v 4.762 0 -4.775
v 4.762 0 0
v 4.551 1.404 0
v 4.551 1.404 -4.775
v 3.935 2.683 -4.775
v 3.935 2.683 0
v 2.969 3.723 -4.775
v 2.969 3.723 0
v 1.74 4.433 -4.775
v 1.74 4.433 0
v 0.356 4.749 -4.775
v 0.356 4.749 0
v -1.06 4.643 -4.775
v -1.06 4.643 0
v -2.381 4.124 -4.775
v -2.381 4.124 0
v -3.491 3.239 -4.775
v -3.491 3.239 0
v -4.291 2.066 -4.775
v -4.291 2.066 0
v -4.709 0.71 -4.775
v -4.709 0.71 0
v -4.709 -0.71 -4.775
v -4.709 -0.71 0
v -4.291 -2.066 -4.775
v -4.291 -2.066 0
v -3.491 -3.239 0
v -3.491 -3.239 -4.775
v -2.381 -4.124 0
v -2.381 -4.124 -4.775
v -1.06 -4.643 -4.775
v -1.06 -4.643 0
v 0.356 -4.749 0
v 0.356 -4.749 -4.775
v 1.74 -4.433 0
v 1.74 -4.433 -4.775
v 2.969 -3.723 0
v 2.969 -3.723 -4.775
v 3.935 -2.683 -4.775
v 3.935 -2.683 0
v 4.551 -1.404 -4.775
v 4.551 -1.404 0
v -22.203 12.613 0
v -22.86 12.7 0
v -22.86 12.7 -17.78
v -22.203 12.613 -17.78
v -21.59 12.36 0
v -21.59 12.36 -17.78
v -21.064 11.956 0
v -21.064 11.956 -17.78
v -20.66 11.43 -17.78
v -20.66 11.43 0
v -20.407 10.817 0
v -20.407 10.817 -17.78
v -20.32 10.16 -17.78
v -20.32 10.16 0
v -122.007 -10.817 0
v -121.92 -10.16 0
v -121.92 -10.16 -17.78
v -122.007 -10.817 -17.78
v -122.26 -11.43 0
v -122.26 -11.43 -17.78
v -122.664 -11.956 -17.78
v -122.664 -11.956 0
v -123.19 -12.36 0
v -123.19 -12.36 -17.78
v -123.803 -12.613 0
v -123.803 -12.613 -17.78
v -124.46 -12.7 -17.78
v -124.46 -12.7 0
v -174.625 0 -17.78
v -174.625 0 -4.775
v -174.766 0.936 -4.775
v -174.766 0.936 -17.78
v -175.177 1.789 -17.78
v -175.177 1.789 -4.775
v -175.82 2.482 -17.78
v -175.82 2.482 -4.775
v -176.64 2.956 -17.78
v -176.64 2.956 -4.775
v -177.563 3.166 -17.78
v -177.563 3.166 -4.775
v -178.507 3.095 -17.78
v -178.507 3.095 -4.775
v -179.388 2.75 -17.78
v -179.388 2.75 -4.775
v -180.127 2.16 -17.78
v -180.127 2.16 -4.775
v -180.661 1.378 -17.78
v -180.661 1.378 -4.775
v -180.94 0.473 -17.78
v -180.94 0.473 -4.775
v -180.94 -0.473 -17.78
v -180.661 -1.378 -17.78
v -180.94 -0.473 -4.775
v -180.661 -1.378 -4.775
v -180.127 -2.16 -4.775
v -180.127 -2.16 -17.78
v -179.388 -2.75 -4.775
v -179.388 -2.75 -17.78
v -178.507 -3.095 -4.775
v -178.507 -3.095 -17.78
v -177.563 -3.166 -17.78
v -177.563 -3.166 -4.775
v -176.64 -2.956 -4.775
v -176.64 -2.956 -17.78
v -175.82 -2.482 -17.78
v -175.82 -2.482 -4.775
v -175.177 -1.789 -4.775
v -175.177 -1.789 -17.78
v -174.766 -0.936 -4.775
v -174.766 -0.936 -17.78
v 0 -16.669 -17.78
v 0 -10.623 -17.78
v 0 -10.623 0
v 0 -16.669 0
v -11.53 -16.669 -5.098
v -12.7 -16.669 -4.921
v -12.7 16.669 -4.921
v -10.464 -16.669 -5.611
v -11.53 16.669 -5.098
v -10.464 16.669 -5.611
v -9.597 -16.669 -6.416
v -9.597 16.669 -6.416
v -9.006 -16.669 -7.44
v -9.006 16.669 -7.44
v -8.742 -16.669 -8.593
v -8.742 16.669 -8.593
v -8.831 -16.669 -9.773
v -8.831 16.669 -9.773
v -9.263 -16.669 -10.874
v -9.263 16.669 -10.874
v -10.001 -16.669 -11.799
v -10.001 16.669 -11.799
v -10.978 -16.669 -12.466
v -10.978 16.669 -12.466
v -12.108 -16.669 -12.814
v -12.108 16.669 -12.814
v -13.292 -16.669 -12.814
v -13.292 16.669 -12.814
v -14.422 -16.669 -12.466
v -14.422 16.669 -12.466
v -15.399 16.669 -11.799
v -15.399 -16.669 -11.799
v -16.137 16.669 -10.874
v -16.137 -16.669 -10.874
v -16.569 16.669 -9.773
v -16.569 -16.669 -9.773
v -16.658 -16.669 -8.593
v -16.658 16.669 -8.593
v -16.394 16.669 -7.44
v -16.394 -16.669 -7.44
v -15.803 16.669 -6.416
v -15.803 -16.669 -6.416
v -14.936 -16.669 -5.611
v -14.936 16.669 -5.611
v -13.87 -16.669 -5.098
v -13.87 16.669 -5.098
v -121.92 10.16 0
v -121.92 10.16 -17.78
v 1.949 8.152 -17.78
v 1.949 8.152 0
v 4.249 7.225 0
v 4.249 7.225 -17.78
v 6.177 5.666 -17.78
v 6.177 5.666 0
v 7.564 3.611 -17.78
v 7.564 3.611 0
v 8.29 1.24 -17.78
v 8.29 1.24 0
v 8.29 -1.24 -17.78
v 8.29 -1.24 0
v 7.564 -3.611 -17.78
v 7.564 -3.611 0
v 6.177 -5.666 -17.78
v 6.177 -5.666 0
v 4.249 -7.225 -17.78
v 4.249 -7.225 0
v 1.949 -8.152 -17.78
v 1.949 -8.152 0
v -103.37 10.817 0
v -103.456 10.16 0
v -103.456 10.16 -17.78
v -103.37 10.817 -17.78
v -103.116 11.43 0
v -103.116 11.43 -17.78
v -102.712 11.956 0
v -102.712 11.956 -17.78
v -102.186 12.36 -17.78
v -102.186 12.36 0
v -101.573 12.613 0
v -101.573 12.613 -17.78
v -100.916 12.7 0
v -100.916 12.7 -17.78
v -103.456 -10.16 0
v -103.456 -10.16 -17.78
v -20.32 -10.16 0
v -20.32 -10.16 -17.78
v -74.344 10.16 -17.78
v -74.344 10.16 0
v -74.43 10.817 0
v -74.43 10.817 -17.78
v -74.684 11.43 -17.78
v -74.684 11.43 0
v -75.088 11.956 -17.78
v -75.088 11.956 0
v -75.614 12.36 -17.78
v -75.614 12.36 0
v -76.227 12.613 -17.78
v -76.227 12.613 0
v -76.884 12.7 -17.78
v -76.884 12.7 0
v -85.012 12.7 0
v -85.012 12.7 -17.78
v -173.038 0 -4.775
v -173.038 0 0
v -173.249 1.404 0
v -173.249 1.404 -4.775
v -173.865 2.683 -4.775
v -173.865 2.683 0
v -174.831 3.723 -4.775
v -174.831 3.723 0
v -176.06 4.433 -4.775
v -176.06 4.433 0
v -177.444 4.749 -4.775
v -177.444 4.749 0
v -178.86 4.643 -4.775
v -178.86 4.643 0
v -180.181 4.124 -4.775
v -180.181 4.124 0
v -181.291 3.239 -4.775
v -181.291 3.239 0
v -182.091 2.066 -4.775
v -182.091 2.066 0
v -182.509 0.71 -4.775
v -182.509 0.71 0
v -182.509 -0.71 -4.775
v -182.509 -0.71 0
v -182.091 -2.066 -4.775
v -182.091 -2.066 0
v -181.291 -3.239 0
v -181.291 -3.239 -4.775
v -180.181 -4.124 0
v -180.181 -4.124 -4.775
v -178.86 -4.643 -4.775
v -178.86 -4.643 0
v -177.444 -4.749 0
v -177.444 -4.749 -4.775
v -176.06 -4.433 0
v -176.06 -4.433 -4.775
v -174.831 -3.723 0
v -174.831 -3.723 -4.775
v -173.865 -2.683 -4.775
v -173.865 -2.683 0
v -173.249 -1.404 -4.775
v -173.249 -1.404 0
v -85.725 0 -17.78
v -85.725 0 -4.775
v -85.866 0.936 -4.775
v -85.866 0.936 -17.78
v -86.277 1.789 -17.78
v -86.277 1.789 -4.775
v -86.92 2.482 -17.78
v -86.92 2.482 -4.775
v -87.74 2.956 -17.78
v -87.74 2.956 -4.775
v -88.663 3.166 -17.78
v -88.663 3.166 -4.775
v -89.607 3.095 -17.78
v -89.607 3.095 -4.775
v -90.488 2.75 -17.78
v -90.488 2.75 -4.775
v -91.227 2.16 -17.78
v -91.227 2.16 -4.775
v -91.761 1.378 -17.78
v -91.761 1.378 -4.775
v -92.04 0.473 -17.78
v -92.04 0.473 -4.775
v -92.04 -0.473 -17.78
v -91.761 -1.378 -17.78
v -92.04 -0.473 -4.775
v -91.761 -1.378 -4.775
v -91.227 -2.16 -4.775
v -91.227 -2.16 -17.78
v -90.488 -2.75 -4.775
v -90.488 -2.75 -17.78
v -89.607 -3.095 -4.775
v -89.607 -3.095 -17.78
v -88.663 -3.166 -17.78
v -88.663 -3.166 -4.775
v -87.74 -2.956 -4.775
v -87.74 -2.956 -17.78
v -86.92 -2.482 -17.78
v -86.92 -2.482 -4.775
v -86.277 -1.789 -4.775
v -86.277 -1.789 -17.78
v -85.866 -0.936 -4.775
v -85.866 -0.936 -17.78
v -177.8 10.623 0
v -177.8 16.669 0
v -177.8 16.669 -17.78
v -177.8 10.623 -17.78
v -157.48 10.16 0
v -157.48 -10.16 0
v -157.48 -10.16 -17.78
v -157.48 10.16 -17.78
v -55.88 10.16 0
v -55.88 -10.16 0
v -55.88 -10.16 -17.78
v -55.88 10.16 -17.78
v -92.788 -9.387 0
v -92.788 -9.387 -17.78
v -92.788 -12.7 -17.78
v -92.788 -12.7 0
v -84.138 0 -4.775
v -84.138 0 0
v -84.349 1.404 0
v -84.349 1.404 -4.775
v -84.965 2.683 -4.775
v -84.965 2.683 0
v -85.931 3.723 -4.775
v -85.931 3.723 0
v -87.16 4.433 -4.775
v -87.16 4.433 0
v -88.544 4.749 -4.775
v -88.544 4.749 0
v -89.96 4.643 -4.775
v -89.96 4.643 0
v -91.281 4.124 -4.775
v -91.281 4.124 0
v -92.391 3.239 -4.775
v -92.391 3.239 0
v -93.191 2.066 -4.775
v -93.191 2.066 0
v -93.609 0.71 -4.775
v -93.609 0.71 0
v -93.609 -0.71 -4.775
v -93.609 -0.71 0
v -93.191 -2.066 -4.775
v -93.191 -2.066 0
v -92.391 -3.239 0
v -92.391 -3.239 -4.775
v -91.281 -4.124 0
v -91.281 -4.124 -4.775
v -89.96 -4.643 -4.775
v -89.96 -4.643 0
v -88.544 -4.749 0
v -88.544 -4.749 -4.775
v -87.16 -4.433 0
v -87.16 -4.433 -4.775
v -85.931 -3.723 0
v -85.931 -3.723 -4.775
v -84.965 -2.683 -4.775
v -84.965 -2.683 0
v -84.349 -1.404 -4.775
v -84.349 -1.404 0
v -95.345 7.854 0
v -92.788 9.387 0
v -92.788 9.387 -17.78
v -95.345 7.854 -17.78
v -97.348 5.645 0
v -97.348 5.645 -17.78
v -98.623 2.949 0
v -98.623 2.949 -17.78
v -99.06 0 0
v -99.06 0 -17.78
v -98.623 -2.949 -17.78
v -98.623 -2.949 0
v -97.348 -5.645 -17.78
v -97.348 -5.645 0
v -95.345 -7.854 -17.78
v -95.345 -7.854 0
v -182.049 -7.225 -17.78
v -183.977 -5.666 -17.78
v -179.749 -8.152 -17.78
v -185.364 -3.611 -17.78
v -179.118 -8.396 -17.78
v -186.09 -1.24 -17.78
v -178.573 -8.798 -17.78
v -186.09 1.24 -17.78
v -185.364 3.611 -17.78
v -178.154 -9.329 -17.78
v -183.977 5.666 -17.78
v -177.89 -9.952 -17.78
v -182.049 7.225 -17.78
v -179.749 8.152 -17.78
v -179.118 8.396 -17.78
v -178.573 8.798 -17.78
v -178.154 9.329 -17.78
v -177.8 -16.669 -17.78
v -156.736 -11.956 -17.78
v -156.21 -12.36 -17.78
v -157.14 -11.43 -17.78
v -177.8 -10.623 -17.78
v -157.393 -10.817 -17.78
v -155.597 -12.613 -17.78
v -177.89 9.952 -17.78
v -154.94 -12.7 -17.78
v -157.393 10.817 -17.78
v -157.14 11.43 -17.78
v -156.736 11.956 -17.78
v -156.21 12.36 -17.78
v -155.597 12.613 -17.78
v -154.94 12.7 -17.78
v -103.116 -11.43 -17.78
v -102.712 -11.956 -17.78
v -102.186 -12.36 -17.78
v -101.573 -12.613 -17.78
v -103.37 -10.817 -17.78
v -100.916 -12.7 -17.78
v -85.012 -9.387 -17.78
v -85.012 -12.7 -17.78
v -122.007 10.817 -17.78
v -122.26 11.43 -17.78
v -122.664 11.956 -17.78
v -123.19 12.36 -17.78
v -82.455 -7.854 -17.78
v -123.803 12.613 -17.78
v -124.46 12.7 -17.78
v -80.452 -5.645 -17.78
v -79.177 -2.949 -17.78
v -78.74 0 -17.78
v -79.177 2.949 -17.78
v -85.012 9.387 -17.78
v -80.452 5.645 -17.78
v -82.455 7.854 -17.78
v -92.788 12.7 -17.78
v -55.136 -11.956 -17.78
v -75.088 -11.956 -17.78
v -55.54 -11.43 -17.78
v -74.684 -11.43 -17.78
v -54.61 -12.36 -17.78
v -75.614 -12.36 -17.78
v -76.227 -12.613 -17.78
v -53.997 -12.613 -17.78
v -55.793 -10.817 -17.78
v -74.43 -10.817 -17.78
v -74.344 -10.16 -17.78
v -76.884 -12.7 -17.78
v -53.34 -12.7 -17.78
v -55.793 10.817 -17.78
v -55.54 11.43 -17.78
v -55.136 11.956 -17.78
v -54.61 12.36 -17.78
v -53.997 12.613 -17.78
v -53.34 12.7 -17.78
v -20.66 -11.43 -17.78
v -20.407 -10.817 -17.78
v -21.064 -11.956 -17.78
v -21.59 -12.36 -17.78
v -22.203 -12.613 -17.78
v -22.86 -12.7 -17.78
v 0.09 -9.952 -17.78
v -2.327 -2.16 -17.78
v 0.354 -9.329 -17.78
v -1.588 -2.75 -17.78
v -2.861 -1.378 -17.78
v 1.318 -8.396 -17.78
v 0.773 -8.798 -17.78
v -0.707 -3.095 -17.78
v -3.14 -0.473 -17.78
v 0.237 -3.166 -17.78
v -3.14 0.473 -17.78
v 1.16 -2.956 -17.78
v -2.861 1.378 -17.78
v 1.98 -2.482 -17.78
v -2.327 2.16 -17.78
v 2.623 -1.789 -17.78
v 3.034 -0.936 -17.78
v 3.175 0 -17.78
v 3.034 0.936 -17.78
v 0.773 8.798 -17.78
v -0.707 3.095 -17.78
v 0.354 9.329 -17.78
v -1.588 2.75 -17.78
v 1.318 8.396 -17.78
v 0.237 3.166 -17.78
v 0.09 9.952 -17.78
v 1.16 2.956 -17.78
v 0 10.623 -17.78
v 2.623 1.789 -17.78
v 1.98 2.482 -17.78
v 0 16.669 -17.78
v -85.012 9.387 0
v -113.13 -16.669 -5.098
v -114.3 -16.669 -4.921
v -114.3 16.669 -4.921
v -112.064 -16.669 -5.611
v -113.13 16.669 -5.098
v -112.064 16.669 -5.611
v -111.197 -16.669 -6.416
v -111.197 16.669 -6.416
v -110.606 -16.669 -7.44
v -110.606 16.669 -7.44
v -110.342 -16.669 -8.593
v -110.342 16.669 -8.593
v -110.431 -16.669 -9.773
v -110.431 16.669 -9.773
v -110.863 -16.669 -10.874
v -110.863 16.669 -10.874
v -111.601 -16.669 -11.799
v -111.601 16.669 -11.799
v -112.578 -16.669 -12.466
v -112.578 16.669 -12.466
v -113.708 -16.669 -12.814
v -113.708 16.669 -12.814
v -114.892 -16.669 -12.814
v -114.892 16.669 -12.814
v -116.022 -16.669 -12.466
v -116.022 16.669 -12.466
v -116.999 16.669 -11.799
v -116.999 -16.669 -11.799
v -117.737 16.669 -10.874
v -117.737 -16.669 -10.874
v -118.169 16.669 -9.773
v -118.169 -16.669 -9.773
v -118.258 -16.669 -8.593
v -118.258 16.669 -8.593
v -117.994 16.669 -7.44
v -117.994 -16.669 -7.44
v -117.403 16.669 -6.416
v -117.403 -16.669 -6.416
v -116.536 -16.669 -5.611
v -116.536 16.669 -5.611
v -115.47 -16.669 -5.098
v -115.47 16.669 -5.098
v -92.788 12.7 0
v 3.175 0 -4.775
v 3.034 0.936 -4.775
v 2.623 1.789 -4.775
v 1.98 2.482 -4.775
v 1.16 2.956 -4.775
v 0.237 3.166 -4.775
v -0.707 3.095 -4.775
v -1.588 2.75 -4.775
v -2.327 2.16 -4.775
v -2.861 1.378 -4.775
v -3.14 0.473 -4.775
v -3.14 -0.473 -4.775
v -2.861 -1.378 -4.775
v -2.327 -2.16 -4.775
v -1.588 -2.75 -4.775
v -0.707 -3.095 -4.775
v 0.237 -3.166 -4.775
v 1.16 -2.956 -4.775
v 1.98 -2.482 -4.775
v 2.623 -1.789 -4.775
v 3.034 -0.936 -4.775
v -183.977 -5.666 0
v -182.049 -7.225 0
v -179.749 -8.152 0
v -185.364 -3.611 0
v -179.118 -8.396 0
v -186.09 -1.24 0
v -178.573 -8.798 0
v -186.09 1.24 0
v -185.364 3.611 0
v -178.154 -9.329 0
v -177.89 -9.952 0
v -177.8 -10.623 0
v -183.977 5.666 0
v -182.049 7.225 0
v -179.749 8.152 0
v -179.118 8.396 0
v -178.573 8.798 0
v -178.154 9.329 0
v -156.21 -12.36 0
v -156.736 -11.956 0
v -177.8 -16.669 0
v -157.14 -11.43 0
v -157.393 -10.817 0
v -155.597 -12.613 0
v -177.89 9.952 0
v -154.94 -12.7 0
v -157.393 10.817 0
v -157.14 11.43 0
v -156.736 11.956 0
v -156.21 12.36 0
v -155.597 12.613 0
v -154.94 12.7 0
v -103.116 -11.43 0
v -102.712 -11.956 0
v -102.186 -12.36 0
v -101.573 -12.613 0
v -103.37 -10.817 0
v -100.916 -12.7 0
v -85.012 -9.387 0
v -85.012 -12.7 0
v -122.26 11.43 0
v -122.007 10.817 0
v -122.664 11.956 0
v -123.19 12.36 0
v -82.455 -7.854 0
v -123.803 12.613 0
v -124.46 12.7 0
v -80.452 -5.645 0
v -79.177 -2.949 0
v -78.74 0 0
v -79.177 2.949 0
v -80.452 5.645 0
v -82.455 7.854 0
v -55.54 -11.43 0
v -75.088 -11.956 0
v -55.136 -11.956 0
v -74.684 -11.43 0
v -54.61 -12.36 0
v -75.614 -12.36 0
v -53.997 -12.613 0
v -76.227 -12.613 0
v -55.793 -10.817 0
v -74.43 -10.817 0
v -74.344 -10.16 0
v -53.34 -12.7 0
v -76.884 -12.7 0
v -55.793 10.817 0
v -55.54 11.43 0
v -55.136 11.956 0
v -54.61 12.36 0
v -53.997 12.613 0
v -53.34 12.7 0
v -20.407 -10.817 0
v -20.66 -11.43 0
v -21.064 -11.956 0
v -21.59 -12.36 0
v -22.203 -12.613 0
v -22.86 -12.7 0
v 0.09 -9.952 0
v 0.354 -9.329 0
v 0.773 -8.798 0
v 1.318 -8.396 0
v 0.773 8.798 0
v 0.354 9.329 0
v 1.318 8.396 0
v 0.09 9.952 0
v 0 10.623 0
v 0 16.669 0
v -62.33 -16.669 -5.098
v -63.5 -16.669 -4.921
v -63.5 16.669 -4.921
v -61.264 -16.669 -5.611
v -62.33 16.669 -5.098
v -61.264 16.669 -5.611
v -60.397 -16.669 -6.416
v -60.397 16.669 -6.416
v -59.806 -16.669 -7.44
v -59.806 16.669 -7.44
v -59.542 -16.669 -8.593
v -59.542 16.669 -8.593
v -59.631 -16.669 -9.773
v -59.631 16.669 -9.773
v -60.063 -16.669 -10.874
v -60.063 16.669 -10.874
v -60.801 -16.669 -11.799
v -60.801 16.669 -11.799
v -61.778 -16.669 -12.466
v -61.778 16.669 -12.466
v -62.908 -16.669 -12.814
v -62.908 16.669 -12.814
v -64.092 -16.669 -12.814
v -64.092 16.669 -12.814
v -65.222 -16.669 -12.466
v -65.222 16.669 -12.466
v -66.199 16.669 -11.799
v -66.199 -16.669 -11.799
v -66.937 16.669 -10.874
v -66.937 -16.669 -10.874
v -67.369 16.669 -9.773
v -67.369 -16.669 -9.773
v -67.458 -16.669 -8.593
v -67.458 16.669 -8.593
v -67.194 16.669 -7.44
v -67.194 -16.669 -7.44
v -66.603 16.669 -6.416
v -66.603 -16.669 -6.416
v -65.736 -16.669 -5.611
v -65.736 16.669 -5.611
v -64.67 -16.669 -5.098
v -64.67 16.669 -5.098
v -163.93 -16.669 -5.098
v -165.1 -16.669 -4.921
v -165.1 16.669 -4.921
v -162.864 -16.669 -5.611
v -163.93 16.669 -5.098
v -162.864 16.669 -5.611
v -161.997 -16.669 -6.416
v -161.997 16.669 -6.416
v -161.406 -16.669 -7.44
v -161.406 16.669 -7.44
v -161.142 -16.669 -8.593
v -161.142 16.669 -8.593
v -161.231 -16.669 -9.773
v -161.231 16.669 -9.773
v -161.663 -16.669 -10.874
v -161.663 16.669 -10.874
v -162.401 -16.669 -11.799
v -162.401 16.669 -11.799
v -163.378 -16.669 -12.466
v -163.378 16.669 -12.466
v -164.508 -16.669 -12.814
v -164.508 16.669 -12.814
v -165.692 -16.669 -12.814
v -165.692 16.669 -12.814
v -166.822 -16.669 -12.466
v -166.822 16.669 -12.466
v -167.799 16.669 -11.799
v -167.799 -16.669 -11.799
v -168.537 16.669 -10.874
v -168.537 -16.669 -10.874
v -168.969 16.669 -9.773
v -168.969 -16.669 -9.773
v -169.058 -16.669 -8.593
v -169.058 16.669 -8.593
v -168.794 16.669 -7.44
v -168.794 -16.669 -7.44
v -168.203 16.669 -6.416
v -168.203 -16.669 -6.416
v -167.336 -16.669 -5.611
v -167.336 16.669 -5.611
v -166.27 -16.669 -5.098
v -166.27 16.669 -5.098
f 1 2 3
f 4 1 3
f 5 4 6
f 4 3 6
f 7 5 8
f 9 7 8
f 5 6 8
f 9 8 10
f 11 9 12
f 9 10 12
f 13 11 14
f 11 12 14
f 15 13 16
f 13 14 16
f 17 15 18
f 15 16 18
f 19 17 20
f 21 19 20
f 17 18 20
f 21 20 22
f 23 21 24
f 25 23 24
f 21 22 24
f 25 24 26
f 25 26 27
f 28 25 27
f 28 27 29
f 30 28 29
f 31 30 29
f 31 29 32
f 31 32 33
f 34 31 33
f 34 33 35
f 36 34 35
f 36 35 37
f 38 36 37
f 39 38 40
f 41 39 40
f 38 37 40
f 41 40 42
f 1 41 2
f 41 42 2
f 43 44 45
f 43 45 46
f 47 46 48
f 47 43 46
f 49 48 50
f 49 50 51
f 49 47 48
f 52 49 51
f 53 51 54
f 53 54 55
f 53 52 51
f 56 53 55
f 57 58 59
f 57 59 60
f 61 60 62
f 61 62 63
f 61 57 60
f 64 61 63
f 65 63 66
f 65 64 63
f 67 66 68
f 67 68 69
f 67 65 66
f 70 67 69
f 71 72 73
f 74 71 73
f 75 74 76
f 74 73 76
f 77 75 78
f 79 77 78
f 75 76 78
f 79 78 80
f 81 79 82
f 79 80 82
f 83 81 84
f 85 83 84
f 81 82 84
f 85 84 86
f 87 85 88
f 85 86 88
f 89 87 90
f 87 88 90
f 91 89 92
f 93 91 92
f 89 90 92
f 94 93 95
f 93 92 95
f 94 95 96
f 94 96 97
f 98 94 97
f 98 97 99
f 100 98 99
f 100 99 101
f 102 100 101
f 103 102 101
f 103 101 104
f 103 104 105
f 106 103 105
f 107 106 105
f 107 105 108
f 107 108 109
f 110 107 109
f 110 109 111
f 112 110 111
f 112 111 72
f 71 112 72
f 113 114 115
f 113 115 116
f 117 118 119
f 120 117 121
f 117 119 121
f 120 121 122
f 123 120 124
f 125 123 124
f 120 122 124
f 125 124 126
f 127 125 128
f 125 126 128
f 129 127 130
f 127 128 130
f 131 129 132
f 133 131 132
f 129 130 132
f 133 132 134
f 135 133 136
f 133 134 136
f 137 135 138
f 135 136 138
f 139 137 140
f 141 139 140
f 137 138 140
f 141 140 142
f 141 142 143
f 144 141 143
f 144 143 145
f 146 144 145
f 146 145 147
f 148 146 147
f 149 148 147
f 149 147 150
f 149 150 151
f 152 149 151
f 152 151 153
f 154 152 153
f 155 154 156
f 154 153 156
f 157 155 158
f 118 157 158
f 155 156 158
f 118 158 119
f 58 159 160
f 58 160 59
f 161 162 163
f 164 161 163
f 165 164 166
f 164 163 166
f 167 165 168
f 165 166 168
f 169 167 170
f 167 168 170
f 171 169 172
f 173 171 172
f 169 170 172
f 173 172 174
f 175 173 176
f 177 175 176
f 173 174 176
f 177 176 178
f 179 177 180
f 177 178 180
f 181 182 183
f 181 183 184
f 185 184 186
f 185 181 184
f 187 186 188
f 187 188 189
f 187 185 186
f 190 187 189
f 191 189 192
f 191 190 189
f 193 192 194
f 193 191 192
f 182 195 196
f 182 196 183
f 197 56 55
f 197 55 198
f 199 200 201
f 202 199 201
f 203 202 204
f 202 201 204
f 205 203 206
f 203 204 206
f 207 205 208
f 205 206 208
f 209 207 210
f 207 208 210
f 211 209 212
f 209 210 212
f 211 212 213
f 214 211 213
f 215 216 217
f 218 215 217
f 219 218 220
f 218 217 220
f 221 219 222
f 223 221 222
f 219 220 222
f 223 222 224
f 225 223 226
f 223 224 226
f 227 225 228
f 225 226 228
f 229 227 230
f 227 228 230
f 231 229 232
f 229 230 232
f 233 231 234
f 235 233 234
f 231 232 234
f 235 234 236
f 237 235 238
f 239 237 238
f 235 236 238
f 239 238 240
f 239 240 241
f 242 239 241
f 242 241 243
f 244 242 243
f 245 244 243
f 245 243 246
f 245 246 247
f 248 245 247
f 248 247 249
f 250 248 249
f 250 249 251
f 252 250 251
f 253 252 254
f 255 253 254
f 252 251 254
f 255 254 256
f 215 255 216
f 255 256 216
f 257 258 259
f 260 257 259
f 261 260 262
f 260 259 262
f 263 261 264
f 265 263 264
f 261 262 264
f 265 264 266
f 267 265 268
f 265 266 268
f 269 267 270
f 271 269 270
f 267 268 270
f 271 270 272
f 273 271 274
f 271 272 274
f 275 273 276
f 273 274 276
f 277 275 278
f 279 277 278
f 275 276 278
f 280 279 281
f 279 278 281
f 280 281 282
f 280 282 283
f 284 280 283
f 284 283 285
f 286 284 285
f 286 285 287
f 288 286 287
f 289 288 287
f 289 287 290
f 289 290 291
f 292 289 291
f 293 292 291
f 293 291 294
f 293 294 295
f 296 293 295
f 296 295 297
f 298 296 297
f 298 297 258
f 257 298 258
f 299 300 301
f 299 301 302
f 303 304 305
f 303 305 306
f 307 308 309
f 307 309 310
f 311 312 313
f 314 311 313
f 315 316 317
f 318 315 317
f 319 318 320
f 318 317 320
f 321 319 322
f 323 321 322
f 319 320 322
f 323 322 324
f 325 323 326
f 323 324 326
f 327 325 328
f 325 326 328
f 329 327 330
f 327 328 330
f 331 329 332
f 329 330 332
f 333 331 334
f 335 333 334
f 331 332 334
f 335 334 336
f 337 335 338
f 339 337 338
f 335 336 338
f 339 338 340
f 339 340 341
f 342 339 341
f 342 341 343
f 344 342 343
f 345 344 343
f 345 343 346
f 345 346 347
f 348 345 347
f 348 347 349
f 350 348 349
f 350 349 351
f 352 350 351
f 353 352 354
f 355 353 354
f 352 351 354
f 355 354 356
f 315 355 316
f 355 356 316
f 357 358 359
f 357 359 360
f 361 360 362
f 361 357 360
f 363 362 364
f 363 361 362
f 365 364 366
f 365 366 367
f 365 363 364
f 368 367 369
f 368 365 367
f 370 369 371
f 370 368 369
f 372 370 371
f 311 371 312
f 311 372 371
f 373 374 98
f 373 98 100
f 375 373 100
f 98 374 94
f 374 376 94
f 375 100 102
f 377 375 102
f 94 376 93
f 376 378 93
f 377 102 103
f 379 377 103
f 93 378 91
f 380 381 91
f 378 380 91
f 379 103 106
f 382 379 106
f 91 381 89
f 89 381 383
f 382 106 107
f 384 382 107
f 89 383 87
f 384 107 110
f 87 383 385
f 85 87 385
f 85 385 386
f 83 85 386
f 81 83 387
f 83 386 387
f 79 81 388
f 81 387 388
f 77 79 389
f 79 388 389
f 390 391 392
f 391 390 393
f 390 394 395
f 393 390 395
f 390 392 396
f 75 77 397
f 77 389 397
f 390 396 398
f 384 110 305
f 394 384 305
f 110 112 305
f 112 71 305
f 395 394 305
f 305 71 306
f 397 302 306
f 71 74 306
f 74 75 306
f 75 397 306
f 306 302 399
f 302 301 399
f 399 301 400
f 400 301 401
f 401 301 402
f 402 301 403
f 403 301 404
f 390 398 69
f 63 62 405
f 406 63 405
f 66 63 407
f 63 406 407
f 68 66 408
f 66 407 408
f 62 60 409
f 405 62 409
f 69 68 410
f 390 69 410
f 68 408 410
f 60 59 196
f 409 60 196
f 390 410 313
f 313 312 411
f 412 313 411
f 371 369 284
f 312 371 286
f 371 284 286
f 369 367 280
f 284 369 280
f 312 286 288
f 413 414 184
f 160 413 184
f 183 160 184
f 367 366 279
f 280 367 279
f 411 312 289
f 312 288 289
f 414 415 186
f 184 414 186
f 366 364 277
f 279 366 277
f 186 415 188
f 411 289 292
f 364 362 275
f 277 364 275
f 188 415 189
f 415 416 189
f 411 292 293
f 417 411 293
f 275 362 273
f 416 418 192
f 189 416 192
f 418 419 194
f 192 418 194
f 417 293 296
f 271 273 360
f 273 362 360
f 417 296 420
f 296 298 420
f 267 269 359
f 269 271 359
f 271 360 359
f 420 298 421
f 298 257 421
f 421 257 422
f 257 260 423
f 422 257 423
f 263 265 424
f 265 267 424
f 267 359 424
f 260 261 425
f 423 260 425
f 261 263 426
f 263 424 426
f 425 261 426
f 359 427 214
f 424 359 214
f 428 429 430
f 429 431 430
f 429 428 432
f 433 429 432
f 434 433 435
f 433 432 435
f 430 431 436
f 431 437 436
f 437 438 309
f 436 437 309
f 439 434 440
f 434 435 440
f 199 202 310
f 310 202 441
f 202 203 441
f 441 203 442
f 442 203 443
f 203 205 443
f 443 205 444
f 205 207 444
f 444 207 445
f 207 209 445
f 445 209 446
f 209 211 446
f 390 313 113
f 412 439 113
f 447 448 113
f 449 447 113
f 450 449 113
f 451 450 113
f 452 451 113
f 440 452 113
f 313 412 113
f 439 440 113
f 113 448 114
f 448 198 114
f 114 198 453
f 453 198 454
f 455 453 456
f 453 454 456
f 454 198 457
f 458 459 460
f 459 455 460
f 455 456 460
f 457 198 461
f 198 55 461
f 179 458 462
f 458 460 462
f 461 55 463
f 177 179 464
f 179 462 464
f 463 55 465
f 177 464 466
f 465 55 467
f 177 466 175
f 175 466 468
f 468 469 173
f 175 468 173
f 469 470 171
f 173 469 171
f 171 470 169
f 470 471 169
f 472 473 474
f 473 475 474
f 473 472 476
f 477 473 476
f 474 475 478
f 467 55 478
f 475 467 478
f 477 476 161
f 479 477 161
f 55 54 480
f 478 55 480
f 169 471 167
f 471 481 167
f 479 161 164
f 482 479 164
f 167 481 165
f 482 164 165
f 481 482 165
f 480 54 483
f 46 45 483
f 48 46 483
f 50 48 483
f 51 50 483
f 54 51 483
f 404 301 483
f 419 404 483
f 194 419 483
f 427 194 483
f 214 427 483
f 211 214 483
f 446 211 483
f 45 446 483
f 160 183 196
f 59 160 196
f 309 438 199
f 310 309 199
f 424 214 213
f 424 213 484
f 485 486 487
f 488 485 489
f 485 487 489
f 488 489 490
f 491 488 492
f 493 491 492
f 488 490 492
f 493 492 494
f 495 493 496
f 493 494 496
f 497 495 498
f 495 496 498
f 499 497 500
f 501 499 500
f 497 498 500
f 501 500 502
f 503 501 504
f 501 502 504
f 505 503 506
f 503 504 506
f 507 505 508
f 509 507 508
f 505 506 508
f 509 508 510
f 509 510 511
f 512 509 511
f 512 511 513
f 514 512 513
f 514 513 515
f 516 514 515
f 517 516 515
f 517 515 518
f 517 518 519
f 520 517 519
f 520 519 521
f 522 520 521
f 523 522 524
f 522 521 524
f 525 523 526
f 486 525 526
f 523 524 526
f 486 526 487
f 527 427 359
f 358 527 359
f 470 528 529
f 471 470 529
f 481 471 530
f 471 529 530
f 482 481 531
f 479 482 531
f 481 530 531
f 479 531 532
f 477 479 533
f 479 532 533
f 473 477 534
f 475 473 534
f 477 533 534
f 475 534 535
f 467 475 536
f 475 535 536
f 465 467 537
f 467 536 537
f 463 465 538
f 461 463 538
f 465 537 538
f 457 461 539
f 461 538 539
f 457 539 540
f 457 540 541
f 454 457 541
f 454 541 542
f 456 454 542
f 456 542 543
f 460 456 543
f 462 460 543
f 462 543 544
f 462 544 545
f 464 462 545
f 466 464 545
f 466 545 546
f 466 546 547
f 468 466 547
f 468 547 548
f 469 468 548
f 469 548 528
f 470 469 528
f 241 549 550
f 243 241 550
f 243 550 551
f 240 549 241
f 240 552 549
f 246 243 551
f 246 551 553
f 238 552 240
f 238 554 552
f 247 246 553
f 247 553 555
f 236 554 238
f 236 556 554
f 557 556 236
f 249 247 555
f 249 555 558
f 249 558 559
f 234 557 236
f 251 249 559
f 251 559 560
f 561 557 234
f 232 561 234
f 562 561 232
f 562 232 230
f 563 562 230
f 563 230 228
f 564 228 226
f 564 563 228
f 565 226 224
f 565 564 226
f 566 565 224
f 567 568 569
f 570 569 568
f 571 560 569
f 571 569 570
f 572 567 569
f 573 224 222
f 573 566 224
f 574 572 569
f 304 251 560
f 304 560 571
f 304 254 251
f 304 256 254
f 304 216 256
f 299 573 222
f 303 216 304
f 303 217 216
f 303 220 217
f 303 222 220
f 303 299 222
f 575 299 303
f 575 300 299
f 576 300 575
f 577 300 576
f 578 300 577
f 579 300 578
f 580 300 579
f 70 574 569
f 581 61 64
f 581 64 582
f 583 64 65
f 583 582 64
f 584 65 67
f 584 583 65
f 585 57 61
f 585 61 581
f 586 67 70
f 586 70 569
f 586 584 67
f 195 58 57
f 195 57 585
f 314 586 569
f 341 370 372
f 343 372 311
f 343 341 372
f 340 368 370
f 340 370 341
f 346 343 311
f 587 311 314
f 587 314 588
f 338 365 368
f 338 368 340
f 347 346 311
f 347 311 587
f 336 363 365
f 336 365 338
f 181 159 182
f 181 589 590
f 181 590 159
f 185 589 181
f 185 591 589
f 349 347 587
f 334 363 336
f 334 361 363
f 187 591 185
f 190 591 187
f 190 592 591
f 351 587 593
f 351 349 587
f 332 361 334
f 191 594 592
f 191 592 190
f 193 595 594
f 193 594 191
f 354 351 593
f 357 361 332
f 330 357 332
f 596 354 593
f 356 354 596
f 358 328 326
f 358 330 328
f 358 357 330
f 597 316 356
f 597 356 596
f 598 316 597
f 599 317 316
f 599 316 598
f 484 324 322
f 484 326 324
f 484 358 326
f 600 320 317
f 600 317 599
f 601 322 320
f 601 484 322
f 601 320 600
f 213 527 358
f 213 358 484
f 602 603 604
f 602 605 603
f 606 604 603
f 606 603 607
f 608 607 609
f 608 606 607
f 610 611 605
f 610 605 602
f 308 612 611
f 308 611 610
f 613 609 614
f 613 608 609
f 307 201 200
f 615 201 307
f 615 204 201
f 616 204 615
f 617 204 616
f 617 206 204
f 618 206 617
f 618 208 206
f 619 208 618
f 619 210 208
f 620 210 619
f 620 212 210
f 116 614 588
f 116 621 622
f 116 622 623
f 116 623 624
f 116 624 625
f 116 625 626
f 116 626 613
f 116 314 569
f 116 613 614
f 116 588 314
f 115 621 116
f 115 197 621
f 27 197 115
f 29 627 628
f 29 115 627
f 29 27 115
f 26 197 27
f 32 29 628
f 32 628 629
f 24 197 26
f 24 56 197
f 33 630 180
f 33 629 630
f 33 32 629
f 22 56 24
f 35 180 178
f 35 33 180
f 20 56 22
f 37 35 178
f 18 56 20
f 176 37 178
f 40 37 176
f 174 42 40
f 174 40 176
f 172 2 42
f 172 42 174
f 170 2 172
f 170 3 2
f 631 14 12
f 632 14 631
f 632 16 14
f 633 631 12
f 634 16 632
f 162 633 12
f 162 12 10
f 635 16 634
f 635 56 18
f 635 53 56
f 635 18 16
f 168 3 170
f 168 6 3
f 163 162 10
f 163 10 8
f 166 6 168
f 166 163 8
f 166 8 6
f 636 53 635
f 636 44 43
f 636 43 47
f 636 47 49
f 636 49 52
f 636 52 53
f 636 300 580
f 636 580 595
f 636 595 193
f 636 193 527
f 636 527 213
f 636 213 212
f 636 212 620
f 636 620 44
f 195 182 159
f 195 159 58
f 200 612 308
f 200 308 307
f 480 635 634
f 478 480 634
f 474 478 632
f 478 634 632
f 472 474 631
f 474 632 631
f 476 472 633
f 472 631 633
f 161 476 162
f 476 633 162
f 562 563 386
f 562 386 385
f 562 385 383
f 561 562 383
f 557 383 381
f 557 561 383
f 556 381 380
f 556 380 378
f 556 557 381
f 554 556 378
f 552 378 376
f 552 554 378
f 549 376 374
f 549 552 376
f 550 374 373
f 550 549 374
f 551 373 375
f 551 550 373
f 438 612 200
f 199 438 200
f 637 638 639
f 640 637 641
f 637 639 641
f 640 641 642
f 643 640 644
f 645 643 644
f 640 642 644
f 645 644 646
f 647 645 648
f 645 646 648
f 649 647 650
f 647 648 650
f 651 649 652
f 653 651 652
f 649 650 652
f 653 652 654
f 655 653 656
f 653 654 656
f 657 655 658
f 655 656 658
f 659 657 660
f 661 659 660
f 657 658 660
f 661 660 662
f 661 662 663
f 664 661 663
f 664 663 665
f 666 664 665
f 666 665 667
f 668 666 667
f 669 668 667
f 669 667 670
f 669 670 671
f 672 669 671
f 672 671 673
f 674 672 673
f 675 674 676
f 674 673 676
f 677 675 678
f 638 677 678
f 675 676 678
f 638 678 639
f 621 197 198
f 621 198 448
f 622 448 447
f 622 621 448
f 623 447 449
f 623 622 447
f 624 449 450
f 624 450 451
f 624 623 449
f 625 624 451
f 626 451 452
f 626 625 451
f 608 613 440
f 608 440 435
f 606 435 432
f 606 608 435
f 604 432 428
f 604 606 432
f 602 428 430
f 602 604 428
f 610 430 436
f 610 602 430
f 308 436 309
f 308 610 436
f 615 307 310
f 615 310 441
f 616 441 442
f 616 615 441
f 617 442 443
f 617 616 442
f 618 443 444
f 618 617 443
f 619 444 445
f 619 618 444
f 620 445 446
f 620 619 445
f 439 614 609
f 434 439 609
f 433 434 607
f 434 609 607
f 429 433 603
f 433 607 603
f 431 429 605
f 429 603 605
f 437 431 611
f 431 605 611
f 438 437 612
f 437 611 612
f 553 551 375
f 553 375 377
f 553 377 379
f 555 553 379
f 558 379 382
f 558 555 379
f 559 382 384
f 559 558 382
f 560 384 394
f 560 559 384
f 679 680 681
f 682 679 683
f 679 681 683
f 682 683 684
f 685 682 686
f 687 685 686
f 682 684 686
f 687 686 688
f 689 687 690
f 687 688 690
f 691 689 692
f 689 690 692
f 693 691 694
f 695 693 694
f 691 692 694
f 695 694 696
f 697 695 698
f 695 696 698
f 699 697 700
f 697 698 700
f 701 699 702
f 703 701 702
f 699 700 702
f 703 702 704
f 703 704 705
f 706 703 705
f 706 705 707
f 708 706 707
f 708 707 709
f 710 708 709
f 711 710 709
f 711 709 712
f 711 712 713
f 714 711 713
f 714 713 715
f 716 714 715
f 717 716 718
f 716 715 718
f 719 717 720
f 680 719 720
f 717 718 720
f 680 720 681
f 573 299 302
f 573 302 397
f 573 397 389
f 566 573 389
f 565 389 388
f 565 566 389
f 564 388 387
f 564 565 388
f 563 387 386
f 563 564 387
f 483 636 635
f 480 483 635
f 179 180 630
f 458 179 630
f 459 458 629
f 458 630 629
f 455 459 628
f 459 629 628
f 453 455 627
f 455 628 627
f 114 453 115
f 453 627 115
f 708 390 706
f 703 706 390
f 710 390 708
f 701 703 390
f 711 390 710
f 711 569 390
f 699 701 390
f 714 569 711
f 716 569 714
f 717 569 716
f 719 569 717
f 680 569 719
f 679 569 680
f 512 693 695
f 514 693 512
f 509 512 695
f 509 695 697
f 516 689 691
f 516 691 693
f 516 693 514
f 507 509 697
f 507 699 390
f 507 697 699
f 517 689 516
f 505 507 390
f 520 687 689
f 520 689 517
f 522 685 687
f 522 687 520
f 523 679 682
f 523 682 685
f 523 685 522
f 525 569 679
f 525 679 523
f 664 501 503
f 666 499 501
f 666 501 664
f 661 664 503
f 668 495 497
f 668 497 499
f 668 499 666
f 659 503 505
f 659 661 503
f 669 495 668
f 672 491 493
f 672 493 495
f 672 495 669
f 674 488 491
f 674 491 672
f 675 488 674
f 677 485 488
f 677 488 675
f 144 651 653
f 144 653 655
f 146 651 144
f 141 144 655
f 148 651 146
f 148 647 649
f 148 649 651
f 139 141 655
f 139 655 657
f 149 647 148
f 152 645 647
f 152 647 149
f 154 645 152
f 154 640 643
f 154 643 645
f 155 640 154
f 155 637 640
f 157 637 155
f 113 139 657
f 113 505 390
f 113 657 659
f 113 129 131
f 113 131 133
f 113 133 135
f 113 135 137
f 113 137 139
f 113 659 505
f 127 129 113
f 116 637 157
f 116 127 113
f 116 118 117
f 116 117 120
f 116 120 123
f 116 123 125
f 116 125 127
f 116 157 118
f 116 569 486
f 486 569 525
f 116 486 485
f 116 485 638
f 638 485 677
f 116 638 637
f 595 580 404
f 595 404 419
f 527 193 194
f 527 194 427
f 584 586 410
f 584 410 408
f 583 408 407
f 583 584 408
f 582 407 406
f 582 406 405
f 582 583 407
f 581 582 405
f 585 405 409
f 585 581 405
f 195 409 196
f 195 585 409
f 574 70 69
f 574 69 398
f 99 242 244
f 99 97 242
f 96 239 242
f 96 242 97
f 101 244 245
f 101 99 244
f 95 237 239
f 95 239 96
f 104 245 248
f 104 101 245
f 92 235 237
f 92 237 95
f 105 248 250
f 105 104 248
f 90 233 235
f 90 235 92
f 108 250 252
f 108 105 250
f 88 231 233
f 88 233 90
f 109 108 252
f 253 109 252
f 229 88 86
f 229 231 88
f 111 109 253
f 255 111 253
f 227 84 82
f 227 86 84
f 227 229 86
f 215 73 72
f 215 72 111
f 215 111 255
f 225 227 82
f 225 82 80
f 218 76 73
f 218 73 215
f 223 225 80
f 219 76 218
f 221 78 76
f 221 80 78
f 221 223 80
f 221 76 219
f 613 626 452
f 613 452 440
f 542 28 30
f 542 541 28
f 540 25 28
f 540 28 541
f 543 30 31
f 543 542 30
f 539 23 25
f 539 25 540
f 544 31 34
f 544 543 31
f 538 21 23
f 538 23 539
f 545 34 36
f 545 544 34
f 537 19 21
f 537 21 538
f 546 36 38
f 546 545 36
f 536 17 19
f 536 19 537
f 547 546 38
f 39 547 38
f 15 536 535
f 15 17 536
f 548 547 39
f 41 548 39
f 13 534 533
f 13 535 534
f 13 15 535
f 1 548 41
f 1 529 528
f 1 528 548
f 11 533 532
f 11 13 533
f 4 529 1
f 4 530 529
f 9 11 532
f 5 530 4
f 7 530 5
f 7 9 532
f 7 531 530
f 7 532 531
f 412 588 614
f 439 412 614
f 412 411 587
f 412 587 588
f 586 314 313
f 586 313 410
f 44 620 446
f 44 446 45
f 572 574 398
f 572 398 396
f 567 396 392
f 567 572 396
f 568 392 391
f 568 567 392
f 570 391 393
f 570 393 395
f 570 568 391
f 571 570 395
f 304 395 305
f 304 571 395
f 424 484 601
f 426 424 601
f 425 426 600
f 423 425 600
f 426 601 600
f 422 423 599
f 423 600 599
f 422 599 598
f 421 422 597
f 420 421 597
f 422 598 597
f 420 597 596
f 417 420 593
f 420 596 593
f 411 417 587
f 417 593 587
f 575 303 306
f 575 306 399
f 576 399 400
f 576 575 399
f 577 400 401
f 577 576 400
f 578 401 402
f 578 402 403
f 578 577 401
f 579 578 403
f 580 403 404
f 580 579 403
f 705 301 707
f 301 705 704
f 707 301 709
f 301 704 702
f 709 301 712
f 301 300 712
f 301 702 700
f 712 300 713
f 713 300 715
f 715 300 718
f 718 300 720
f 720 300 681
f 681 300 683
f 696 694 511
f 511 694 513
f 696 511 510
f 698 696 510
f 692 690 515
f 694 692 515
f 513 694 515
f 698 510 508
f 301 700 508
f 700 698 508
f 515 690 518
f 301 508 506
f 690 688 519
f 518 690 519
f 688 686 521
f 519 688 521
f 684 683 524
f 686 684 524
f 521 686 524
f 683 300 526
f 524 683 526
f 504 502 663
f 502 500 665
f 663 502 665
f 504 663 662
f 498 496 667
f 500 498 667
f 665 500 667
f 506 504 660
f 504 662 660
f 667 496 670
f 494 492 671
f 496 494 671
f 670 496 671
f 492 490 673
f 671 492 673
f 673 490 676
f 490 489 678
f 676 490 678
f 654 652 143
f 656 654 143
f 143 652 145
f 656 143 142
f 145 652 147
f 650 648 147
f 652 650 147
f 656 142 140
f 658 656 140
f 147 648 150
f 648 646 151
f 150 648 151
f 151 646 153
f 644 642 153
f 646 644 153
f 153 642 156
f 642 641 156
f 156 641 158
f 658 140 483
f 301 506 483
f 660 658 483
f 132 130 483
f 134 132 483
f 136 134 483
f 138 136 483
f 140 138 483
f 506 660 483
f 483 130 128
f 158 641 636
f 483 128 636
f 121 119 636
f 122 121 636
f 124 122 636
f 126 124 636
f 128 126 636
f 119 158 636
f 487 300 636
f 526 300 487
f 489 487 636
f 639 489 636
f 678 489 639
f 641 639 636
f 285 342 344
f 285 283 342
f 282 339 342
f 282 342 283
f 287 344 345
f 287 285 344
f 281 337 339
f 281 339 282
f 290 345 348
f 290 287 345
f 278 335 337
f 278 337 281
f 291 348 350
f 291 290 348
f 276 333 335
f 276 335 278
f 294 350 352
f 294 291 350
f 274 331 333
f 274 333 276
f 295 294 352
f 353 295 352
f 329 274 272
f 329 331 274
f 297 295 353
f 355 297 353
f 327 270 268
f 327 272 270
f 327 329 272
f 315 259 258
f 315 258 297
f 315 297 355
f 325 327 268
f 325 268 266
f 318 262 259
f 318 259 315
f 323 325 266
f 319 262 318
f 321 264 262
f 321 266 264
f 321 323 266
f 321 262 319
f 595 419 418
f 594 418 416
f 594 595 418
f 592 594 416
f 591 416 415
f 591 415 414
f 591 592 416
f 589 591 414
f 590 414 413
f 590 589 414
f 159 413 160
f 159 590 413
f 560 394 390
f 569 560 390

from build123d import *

# Parameters (mm, degrees)
SKETCH1_W           = 195.2625
SKETCH1_H           = 33.3375
SKETCH1_R           = 3.175
BOSS_EXTRUDE1_DEPTH = 17.78
SKETCH2_R           = 3.96875
CUT_EXTRUDE1_DEPTH  = 33.3375
SKETCH3_R           = 4.7625
CUT_EXTRUDE2_DEPTH  = 4.7752
CUT_EXTRUDE3_DEPTH  = 17.78


with BuildPart() as part:
    # Sketch1 → Boss-Extrude1 (new body)
    with BuildSketch(Plane.XY):
        with Locations((-88.9, 0)):
            Rectangle(SKETCH1_W, SKETCH1_H)
        Circle(SKETCH1_R, mode=Mode.SUBTRACT)
        with Locations((-177.8, 0)):
            Circle(SKETCH1_R, mode=Mode.SUBTRACT)
        with Locations((-88.9, 0)):
            Circle(SKETCH1_R, mode=Mode.SUBTRACT)
    extrude(amount=-BOSS_EXTRUDE1_DEPTH)

    # Sketch2 → Cut-Extrude1 (cut)
    with BuildSketch(Plane(origin=(0, 16.66875, 0), x_dir=(1, 0, 0), z_dir=(0, 1, 0))):
        with Locations(Location((-12.7, 8.89, 0), (0, 0, 270))):
            Circle(SKETCH2_R)
        with Locations(Location((-63.5, 8.89, 0), (0, 0, 270))):
            Circle(SKETCH2_R)
        with Locations(Location((-114.3, 8.89, 0), (0, 0, 270))):
            Circle(SKETCH2_R)
        with Locations(Location((-165.1, 8.89, 0), (0, 0, 270))):
            Circle(SKETCH2_R)
    extrude(amount=-CUT_EXTRUDE1_DEPTH, mode=Mode.SUBTRACT)

    # Sketch3 → Cut-Extrude2 (cut)
    with BuildSketch(Plane.XY):
        Circle(SKETCH3_R)
        with Locations((-88.9, 0)):
            Circle(SKETCH3_R)
        with Locations((-177.8, 0)):
            Circle(SKETCH3_R)
    extrude(amount=-CUT_EXTRUDE2_DEPTH, mode=Mode.SUBTRACT)

    # Sketch5 → Cut-Extrude3 (cut)
    with BuildSketch(Plane.XY):
        with BuildLine():
            Line((0, -16.66875), (8.73125, -16.66875))
            Line((8.73125, -16.66875), (8.73125, 16.66875))
            Line((8.73125, 16.66875), (0, 16.66875))
            Line((0, 16.66875), (0, 10.622546022))
            ThreePointArc((0, 10.622546022), (0.546012526, 9.049137635), (1.949302326, 8.152186482))
            ThreePointArc((1.949302326, 8.152186482), (8.382, 0), (1.949302326, -8.152186482))
            ThreePointArc((1.949302326, -8.152186482), (0.546012526, -9.049137635), (0, -10.622546022))
            Line((0, -10.622546022), (0, -16.66875))
        make_face()
        with BuildLine():
            Line((-22.86, -12.7), (-53.34, -12.7))
            ThreePointArc((-53.34, -12.7), (-55.136051224, -11.956051224), (-55.88, -10.16))
            Line((-55.88, -10.16), (-55.88, 10.16))
            ThreePointArc((-55.88, 10.16), (-55.136051224, 11.956051224), (-53.34, 12.7))
            Line((-53.34, 12.7), (-22.86, 12.7))
            ThreePointArc((-22.86, 12.7), (-21.063948776, 11.956051224), (-20.32, 10.16))
            Line((-20.32, 10.16), (-20.32, -10.16))
            ThreePointArc((-20.32, -10.16), (-21.063948776, -11.956051224), (-22.86, -12.7))
        make_face()
        with BuildLine():
            Line((-85.011936327, -9.38661605), (-85.011936327, -12.7))
            Line((-85.011936327, -12.7), (-76.883936327, -12.7))
            ThreePointArc((-76.883936327, -12.7), (-75.087885103, -11.956051224), (-74.343936327, -10.16))
            Line((-74.343936327, -10.16), (-74.343936327, 10.16))
            ThreePointArc((-74.343936327, 10.16), (-75.087885103, 11.956051224), (-76.883936327, 12.7))
            Line((-76.883936327, 12.7), (-85.011936327, 12.7))
            Line((-85.011936327, 12.7), (-85.011936327, 9.38661605))
            ThreePointArc((-85.011936327, 9.38661605), (-78.74, 0), (-85.011936327, -9.38661605))
        make_face()
        with BuildLine():
            Line((-100.916063673, 12.7), (-92.788063673, 12.7))
            Line((-92.788063673, 12.7), (-92.788063673, 9.38661605))
            ThreePointArc((-92.788063673, 9.38661605), (-99.06, 0), (-92.788063673, -9.38661605))
            Line((-92.788063673, -9.38661605), (-92.788063673, -12.7))
            Line((-92.788063673, -12.7), (-100.916063673, -12.7))
            ThreePointArc((-100.916063673, -12.7), (-102.712114897, -11.956051224), (-103.456063673, -10.16))
            Line((-103.456063673, -10.16), (-103.456063673, 10.16))
            ThreePointArc((-103.456063673, 10.16), (-102.712114897, 11.956051224), (-100.916063673, 12.7))
        make_face()
        with BuildLine():
            Line((-154.94, 12.7), (-124.46, 12.7))
            ThreePointArc((-124.46, 12.7), (-122.663948776, 11.956051224), (-121.92, 10.16))
            Line((-121.92, 10.16), (-121.92, -10.16))
            ThreePointArc((-121.92, -10.16), (-122.663948776, -11.956051224), (-124.46, -12.7))
            Line((-124.46, -12.7), (-154.94, -12.7))
            ThreePointArc((-154.94, -12.7), (-156.736051224, -11.956051224), (-157.48, -10.16))
            Line((-157.48, -10.16), (-157.48, 10.16))
            ThreePointArc((-157.48, 10.16), (-156.736051224, 11.956051224), (-154.94, 12.7))
        make_face()
        with BuildLine():
            Line((-186.53125, -16.66875), (-186.53125, 16.66875))
            Line((-186.53125, 16.66875), (-177.8, 16.66875))
            Line((-177.8, 16.66875), (-177.8, 10.622546022))
            ThreePointArc((-177.8, 10.622546022), (-178.346012526, 9.049137635), (-179.749302326, 8.152186482))
            ThreePointArc((-179.749302326, 8.152186482), (-186.182, 0), (-179.749302326, -8.152186482))
            ThreePointArc((-179.749302326, -8.152186482), (-178.346012526, -9.049137635), (-177.8, -10.622546022))
            Line((-177.8, -10.622546022), (-177.8, -16.66875))
            Line((-177.8, -16.66875), (-186.53125, -16.66875))
        make_face()
    extrude(amount=-CUT_EXTRUDE3_DEPTH, mode=Mode.SUBTRACT)


solid = part.part
